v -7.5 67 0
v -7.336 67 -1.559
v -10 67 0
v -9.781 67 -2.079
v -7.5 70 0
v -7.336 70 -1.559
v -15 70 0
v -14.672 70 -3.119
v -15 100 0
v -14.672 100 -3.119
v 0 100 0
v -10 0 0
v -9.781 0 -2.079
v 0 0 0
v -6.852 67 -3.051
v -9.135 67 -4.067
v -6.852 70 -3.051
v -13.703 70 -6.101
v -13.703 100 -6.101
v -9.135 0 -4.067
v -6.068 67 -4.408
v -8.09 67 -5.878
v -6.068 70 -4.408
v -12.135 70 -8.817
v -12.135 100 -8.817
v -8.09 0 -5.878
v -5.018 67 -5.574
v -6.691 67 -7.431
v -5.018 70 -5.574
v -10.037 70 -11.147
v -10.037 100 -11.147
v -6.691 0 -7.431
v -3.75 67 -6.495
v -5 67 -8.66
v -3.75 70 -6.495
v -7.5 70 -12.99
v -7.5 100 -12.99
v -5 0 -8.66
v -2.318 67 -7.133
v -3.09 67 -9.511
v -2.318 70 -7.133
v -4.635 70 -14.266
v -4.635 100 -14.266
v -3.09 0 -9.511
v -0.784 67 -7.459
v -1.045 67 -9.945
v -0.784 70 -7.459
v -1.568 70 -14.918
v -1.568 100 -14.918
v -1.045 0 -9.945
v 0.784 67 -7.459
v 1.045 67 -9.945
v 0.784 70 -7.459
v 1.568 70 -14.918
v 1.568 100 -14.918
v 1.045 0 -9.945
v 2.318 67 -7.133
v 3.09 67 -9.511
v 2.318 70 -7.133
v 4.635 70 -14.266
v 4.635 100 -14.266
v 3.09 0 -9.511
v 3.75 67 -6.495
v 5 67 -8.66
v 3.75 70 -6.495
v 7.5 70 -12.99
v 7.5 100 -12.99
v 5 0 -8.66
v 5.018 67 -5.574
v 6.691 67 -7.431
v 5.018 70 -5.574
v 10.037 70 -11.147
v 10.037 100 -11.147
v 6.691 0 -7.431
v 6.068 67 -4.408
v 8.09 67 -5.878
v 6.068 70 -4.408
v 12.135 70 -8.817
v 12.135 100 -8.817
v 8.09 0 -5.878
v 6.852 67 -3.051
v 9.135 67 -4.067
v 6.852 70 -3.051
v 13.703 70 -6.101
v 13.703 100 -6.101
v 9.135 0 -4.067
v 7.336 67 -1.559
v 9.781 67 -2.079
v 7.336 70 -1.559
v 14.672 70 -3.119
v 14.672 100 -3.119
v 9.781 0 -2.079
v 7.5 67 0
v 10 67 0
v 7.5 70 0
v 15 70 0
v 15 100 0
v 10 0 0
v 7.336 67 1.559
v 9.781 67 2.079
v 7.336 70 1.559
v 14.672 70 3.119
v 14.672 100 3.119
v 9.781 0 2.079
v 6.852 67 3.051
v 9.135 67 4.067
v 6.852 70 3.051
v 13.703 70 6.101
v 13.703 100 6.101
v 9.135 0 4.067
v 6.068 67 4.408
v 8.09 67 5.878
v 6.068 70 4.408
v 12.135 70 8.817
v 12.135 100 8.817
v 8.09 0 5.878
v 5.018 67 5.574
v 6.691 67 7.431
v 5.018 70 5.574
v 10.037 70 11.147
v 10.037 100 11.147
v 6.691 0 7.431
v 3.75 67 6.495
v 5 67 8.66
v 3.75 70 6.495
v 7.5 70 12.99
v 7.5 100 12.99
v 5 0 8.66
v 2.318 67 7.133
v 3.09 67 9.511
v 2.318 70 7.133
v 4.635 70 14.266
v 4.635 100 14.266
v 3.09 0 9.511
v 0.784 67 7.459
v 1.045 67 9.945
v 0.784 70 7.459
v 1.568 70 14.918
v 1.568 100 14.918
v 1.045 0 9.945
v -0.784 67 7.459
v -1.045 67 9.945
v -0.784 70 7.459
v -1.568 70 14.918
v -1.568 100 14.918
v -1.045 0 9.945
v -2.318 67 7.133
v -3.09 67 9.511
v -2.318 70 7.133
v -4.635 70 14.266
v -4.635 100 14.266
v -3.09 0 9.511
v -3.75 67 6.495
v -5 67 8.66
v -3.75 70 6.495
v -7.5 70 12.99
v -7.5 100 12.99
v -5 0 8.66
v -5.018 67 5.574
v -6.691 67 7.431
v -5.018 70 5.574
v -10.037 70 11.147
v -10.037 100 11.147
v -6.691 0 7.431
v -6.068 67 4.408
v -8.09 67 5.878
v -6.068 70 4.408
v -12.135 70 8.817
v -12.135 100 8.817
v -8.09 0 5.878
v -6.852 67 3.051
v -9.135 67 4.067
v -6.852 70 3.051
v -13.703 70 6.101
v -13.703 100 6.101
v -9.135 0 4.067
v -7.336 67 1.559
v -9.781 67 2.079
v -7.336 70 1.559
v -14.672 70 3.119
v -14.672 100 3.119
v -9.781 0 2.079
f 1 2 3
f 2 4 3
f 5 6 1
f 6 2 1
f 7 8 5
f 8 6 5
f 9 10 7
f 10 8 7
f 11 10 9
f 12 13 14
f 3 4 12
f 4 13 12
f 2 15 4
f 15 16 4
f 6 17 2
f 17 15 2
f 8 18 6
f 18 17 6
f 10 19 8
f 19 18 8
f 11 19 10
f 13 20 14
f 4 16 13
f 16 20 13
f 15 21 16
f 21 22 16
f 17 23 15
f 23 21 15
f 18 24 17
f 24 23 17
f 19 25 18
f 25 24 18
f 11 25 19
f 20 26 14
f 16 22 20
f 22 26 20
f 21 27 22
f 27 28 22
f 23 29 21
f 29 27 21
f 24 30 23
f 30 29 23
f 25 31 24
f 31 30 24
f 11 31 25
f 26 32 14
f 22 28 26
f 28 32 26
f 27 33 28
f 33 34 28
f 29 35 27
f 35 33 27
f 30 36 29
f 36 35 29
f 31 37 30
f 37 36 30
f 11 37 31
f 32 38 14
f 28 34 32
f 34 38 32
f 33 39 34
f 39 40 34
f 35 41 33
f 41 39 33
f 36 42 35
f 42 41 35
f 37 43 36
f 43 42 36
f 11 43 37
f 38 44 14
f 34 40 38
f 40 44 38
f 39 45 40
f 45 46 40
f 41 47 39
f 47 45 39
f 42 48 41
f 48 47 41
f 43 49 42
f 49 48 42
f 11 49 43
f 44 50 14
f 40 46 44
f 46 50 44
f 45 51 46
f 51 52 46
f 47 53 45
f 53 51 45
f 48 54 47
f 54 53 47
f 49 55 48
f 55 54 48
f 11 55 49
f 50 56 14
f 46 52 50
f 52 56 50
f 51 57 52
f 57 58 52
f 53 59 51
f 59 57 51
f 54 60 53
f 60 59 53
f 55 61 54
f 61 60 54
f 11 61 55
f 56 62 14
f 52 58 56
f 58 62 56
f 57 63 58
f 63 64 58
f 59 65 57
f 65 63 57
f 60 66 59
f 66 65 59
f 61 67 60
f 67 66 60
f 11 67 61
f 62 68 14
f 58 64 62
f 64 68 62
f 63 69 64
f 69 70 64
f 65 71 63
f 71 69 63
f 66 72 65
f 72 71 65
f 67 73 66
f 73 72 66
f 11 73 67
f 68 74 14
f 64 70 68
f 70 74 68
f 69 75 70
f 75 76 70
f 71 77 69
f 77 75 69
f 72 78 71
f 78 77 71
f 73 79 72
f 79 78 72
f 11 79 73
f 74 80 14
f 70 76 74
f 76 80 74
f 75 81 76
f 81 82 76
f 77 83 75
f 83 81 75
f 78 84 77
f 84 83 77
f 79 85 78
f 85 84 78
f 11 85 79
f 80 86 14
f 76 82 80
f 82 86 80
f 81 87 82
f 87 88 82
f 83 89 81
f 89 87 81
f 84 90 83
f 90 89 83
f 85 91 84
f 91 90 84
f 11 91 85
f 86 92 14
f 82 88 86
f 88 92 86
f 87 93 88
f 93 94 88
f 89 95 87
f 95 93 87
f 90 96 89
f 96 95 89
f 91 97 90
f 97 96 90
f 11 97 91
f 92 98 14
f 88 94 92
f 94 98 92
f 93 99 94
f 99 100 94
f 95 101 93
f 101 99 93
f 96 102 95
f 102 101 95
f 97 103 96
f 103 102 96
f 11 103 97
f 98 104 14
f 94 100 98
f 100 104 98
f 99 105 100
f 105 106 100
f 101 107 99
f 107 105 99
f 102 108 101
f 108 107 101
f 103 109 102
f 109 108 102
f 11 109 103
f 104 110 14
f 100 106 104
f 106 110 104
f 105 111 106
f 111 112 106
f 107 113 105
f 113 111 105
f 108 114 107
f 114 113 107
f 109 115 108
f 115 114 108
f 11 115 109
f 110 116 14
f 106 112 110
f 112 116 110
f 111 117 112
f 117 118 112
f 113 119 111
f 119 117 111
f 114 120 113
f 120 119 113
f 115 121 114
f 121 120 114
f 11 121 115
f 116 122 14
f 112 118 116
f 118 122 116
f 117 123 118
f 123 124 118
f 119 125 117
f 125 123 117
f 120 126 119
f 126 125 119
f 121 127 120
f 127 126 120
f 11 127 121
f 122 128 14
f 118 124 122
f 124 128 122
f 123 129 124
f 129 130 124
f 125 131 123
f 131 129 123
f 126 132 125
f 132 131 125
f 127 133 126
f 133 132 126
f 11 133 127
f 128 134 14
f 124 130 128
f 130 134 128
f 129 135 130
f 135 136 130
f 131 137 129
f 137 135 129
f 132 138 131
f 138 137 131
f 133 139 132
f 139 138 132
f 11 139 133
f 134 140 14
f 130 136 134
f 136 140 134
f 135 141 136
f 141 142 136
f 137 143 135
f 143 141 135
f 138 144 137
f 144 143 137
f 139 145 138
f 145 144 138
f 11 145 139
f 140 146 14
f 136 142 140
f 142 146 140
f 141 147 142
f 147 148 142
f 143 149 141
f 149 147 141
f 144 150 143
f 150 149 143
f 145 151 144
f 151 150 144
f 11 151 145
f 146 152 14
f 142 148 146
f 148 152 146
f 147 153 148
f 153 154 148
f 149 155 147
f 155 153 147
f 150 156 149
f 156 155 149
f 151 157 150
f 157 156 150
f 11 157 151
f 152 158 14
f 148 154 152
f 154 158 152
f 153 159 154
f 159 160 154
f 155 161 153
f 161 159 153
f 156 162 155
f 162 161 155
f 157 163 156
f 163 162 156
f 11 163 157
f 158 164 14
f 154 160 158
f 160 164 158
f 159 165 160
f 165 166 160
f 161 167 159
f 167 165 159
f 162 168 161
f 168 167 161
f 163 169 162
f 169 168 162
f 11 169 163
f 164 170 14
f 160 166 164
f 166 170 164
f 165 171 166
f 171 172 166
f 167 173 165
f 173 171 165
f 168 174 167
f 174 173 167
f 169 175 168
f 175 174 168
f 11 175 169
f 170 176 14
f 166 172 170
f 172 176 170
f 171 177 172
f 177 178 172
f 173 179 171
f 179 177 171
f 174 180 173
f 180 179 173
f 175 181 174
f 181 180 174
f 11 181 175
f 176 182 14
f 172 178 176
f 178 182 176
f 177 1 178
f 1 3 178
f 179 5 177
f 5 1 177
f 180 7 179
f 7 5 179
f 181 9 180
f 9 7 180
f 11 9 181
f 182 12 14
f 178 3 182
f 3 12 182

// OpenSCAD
// Constants
length = 106;   // Brush Length
width = 40;
height = 40;

lidBoxRatio = .5;

thickness=3;

_boxDepth = height * lidBoxRatio;
_lidDepth = height * (1-lidBoxRatio);

// Assembly
brushProfile();
*box();


//Animation
{
angle = -180*sin($t*180);    


color("blue") 
*box();

translate([0, 0, _boxDepth])
rotate([0,angle,0])
color("red") 
*lid();
}

// Modules
module brushProfile()
{
    rotate([-90, 0, 0])
    rotate_extrude(angle=360) {
        polygon(points=[
            // Backbone
            [0, 0],
            [0, 100],
        
            // Brush Tip
            [15, 100],
            [15, 70],
            [7.5, 70],
            [7.5, 67],
        
            
            // Handle Profile
            [10, 67],
            [10, 0]
        ]);
    }
}
module box() {
    difference() {
        // Main structure
        cube([width, length, _boxDepth]);
        
        // Brush Cutout
        translate([width / 2, thickness, height / 2]) {
            brushProfile();
        }
    }
}

module lid() {
    cube([width, length, _lidDepth]);
}
